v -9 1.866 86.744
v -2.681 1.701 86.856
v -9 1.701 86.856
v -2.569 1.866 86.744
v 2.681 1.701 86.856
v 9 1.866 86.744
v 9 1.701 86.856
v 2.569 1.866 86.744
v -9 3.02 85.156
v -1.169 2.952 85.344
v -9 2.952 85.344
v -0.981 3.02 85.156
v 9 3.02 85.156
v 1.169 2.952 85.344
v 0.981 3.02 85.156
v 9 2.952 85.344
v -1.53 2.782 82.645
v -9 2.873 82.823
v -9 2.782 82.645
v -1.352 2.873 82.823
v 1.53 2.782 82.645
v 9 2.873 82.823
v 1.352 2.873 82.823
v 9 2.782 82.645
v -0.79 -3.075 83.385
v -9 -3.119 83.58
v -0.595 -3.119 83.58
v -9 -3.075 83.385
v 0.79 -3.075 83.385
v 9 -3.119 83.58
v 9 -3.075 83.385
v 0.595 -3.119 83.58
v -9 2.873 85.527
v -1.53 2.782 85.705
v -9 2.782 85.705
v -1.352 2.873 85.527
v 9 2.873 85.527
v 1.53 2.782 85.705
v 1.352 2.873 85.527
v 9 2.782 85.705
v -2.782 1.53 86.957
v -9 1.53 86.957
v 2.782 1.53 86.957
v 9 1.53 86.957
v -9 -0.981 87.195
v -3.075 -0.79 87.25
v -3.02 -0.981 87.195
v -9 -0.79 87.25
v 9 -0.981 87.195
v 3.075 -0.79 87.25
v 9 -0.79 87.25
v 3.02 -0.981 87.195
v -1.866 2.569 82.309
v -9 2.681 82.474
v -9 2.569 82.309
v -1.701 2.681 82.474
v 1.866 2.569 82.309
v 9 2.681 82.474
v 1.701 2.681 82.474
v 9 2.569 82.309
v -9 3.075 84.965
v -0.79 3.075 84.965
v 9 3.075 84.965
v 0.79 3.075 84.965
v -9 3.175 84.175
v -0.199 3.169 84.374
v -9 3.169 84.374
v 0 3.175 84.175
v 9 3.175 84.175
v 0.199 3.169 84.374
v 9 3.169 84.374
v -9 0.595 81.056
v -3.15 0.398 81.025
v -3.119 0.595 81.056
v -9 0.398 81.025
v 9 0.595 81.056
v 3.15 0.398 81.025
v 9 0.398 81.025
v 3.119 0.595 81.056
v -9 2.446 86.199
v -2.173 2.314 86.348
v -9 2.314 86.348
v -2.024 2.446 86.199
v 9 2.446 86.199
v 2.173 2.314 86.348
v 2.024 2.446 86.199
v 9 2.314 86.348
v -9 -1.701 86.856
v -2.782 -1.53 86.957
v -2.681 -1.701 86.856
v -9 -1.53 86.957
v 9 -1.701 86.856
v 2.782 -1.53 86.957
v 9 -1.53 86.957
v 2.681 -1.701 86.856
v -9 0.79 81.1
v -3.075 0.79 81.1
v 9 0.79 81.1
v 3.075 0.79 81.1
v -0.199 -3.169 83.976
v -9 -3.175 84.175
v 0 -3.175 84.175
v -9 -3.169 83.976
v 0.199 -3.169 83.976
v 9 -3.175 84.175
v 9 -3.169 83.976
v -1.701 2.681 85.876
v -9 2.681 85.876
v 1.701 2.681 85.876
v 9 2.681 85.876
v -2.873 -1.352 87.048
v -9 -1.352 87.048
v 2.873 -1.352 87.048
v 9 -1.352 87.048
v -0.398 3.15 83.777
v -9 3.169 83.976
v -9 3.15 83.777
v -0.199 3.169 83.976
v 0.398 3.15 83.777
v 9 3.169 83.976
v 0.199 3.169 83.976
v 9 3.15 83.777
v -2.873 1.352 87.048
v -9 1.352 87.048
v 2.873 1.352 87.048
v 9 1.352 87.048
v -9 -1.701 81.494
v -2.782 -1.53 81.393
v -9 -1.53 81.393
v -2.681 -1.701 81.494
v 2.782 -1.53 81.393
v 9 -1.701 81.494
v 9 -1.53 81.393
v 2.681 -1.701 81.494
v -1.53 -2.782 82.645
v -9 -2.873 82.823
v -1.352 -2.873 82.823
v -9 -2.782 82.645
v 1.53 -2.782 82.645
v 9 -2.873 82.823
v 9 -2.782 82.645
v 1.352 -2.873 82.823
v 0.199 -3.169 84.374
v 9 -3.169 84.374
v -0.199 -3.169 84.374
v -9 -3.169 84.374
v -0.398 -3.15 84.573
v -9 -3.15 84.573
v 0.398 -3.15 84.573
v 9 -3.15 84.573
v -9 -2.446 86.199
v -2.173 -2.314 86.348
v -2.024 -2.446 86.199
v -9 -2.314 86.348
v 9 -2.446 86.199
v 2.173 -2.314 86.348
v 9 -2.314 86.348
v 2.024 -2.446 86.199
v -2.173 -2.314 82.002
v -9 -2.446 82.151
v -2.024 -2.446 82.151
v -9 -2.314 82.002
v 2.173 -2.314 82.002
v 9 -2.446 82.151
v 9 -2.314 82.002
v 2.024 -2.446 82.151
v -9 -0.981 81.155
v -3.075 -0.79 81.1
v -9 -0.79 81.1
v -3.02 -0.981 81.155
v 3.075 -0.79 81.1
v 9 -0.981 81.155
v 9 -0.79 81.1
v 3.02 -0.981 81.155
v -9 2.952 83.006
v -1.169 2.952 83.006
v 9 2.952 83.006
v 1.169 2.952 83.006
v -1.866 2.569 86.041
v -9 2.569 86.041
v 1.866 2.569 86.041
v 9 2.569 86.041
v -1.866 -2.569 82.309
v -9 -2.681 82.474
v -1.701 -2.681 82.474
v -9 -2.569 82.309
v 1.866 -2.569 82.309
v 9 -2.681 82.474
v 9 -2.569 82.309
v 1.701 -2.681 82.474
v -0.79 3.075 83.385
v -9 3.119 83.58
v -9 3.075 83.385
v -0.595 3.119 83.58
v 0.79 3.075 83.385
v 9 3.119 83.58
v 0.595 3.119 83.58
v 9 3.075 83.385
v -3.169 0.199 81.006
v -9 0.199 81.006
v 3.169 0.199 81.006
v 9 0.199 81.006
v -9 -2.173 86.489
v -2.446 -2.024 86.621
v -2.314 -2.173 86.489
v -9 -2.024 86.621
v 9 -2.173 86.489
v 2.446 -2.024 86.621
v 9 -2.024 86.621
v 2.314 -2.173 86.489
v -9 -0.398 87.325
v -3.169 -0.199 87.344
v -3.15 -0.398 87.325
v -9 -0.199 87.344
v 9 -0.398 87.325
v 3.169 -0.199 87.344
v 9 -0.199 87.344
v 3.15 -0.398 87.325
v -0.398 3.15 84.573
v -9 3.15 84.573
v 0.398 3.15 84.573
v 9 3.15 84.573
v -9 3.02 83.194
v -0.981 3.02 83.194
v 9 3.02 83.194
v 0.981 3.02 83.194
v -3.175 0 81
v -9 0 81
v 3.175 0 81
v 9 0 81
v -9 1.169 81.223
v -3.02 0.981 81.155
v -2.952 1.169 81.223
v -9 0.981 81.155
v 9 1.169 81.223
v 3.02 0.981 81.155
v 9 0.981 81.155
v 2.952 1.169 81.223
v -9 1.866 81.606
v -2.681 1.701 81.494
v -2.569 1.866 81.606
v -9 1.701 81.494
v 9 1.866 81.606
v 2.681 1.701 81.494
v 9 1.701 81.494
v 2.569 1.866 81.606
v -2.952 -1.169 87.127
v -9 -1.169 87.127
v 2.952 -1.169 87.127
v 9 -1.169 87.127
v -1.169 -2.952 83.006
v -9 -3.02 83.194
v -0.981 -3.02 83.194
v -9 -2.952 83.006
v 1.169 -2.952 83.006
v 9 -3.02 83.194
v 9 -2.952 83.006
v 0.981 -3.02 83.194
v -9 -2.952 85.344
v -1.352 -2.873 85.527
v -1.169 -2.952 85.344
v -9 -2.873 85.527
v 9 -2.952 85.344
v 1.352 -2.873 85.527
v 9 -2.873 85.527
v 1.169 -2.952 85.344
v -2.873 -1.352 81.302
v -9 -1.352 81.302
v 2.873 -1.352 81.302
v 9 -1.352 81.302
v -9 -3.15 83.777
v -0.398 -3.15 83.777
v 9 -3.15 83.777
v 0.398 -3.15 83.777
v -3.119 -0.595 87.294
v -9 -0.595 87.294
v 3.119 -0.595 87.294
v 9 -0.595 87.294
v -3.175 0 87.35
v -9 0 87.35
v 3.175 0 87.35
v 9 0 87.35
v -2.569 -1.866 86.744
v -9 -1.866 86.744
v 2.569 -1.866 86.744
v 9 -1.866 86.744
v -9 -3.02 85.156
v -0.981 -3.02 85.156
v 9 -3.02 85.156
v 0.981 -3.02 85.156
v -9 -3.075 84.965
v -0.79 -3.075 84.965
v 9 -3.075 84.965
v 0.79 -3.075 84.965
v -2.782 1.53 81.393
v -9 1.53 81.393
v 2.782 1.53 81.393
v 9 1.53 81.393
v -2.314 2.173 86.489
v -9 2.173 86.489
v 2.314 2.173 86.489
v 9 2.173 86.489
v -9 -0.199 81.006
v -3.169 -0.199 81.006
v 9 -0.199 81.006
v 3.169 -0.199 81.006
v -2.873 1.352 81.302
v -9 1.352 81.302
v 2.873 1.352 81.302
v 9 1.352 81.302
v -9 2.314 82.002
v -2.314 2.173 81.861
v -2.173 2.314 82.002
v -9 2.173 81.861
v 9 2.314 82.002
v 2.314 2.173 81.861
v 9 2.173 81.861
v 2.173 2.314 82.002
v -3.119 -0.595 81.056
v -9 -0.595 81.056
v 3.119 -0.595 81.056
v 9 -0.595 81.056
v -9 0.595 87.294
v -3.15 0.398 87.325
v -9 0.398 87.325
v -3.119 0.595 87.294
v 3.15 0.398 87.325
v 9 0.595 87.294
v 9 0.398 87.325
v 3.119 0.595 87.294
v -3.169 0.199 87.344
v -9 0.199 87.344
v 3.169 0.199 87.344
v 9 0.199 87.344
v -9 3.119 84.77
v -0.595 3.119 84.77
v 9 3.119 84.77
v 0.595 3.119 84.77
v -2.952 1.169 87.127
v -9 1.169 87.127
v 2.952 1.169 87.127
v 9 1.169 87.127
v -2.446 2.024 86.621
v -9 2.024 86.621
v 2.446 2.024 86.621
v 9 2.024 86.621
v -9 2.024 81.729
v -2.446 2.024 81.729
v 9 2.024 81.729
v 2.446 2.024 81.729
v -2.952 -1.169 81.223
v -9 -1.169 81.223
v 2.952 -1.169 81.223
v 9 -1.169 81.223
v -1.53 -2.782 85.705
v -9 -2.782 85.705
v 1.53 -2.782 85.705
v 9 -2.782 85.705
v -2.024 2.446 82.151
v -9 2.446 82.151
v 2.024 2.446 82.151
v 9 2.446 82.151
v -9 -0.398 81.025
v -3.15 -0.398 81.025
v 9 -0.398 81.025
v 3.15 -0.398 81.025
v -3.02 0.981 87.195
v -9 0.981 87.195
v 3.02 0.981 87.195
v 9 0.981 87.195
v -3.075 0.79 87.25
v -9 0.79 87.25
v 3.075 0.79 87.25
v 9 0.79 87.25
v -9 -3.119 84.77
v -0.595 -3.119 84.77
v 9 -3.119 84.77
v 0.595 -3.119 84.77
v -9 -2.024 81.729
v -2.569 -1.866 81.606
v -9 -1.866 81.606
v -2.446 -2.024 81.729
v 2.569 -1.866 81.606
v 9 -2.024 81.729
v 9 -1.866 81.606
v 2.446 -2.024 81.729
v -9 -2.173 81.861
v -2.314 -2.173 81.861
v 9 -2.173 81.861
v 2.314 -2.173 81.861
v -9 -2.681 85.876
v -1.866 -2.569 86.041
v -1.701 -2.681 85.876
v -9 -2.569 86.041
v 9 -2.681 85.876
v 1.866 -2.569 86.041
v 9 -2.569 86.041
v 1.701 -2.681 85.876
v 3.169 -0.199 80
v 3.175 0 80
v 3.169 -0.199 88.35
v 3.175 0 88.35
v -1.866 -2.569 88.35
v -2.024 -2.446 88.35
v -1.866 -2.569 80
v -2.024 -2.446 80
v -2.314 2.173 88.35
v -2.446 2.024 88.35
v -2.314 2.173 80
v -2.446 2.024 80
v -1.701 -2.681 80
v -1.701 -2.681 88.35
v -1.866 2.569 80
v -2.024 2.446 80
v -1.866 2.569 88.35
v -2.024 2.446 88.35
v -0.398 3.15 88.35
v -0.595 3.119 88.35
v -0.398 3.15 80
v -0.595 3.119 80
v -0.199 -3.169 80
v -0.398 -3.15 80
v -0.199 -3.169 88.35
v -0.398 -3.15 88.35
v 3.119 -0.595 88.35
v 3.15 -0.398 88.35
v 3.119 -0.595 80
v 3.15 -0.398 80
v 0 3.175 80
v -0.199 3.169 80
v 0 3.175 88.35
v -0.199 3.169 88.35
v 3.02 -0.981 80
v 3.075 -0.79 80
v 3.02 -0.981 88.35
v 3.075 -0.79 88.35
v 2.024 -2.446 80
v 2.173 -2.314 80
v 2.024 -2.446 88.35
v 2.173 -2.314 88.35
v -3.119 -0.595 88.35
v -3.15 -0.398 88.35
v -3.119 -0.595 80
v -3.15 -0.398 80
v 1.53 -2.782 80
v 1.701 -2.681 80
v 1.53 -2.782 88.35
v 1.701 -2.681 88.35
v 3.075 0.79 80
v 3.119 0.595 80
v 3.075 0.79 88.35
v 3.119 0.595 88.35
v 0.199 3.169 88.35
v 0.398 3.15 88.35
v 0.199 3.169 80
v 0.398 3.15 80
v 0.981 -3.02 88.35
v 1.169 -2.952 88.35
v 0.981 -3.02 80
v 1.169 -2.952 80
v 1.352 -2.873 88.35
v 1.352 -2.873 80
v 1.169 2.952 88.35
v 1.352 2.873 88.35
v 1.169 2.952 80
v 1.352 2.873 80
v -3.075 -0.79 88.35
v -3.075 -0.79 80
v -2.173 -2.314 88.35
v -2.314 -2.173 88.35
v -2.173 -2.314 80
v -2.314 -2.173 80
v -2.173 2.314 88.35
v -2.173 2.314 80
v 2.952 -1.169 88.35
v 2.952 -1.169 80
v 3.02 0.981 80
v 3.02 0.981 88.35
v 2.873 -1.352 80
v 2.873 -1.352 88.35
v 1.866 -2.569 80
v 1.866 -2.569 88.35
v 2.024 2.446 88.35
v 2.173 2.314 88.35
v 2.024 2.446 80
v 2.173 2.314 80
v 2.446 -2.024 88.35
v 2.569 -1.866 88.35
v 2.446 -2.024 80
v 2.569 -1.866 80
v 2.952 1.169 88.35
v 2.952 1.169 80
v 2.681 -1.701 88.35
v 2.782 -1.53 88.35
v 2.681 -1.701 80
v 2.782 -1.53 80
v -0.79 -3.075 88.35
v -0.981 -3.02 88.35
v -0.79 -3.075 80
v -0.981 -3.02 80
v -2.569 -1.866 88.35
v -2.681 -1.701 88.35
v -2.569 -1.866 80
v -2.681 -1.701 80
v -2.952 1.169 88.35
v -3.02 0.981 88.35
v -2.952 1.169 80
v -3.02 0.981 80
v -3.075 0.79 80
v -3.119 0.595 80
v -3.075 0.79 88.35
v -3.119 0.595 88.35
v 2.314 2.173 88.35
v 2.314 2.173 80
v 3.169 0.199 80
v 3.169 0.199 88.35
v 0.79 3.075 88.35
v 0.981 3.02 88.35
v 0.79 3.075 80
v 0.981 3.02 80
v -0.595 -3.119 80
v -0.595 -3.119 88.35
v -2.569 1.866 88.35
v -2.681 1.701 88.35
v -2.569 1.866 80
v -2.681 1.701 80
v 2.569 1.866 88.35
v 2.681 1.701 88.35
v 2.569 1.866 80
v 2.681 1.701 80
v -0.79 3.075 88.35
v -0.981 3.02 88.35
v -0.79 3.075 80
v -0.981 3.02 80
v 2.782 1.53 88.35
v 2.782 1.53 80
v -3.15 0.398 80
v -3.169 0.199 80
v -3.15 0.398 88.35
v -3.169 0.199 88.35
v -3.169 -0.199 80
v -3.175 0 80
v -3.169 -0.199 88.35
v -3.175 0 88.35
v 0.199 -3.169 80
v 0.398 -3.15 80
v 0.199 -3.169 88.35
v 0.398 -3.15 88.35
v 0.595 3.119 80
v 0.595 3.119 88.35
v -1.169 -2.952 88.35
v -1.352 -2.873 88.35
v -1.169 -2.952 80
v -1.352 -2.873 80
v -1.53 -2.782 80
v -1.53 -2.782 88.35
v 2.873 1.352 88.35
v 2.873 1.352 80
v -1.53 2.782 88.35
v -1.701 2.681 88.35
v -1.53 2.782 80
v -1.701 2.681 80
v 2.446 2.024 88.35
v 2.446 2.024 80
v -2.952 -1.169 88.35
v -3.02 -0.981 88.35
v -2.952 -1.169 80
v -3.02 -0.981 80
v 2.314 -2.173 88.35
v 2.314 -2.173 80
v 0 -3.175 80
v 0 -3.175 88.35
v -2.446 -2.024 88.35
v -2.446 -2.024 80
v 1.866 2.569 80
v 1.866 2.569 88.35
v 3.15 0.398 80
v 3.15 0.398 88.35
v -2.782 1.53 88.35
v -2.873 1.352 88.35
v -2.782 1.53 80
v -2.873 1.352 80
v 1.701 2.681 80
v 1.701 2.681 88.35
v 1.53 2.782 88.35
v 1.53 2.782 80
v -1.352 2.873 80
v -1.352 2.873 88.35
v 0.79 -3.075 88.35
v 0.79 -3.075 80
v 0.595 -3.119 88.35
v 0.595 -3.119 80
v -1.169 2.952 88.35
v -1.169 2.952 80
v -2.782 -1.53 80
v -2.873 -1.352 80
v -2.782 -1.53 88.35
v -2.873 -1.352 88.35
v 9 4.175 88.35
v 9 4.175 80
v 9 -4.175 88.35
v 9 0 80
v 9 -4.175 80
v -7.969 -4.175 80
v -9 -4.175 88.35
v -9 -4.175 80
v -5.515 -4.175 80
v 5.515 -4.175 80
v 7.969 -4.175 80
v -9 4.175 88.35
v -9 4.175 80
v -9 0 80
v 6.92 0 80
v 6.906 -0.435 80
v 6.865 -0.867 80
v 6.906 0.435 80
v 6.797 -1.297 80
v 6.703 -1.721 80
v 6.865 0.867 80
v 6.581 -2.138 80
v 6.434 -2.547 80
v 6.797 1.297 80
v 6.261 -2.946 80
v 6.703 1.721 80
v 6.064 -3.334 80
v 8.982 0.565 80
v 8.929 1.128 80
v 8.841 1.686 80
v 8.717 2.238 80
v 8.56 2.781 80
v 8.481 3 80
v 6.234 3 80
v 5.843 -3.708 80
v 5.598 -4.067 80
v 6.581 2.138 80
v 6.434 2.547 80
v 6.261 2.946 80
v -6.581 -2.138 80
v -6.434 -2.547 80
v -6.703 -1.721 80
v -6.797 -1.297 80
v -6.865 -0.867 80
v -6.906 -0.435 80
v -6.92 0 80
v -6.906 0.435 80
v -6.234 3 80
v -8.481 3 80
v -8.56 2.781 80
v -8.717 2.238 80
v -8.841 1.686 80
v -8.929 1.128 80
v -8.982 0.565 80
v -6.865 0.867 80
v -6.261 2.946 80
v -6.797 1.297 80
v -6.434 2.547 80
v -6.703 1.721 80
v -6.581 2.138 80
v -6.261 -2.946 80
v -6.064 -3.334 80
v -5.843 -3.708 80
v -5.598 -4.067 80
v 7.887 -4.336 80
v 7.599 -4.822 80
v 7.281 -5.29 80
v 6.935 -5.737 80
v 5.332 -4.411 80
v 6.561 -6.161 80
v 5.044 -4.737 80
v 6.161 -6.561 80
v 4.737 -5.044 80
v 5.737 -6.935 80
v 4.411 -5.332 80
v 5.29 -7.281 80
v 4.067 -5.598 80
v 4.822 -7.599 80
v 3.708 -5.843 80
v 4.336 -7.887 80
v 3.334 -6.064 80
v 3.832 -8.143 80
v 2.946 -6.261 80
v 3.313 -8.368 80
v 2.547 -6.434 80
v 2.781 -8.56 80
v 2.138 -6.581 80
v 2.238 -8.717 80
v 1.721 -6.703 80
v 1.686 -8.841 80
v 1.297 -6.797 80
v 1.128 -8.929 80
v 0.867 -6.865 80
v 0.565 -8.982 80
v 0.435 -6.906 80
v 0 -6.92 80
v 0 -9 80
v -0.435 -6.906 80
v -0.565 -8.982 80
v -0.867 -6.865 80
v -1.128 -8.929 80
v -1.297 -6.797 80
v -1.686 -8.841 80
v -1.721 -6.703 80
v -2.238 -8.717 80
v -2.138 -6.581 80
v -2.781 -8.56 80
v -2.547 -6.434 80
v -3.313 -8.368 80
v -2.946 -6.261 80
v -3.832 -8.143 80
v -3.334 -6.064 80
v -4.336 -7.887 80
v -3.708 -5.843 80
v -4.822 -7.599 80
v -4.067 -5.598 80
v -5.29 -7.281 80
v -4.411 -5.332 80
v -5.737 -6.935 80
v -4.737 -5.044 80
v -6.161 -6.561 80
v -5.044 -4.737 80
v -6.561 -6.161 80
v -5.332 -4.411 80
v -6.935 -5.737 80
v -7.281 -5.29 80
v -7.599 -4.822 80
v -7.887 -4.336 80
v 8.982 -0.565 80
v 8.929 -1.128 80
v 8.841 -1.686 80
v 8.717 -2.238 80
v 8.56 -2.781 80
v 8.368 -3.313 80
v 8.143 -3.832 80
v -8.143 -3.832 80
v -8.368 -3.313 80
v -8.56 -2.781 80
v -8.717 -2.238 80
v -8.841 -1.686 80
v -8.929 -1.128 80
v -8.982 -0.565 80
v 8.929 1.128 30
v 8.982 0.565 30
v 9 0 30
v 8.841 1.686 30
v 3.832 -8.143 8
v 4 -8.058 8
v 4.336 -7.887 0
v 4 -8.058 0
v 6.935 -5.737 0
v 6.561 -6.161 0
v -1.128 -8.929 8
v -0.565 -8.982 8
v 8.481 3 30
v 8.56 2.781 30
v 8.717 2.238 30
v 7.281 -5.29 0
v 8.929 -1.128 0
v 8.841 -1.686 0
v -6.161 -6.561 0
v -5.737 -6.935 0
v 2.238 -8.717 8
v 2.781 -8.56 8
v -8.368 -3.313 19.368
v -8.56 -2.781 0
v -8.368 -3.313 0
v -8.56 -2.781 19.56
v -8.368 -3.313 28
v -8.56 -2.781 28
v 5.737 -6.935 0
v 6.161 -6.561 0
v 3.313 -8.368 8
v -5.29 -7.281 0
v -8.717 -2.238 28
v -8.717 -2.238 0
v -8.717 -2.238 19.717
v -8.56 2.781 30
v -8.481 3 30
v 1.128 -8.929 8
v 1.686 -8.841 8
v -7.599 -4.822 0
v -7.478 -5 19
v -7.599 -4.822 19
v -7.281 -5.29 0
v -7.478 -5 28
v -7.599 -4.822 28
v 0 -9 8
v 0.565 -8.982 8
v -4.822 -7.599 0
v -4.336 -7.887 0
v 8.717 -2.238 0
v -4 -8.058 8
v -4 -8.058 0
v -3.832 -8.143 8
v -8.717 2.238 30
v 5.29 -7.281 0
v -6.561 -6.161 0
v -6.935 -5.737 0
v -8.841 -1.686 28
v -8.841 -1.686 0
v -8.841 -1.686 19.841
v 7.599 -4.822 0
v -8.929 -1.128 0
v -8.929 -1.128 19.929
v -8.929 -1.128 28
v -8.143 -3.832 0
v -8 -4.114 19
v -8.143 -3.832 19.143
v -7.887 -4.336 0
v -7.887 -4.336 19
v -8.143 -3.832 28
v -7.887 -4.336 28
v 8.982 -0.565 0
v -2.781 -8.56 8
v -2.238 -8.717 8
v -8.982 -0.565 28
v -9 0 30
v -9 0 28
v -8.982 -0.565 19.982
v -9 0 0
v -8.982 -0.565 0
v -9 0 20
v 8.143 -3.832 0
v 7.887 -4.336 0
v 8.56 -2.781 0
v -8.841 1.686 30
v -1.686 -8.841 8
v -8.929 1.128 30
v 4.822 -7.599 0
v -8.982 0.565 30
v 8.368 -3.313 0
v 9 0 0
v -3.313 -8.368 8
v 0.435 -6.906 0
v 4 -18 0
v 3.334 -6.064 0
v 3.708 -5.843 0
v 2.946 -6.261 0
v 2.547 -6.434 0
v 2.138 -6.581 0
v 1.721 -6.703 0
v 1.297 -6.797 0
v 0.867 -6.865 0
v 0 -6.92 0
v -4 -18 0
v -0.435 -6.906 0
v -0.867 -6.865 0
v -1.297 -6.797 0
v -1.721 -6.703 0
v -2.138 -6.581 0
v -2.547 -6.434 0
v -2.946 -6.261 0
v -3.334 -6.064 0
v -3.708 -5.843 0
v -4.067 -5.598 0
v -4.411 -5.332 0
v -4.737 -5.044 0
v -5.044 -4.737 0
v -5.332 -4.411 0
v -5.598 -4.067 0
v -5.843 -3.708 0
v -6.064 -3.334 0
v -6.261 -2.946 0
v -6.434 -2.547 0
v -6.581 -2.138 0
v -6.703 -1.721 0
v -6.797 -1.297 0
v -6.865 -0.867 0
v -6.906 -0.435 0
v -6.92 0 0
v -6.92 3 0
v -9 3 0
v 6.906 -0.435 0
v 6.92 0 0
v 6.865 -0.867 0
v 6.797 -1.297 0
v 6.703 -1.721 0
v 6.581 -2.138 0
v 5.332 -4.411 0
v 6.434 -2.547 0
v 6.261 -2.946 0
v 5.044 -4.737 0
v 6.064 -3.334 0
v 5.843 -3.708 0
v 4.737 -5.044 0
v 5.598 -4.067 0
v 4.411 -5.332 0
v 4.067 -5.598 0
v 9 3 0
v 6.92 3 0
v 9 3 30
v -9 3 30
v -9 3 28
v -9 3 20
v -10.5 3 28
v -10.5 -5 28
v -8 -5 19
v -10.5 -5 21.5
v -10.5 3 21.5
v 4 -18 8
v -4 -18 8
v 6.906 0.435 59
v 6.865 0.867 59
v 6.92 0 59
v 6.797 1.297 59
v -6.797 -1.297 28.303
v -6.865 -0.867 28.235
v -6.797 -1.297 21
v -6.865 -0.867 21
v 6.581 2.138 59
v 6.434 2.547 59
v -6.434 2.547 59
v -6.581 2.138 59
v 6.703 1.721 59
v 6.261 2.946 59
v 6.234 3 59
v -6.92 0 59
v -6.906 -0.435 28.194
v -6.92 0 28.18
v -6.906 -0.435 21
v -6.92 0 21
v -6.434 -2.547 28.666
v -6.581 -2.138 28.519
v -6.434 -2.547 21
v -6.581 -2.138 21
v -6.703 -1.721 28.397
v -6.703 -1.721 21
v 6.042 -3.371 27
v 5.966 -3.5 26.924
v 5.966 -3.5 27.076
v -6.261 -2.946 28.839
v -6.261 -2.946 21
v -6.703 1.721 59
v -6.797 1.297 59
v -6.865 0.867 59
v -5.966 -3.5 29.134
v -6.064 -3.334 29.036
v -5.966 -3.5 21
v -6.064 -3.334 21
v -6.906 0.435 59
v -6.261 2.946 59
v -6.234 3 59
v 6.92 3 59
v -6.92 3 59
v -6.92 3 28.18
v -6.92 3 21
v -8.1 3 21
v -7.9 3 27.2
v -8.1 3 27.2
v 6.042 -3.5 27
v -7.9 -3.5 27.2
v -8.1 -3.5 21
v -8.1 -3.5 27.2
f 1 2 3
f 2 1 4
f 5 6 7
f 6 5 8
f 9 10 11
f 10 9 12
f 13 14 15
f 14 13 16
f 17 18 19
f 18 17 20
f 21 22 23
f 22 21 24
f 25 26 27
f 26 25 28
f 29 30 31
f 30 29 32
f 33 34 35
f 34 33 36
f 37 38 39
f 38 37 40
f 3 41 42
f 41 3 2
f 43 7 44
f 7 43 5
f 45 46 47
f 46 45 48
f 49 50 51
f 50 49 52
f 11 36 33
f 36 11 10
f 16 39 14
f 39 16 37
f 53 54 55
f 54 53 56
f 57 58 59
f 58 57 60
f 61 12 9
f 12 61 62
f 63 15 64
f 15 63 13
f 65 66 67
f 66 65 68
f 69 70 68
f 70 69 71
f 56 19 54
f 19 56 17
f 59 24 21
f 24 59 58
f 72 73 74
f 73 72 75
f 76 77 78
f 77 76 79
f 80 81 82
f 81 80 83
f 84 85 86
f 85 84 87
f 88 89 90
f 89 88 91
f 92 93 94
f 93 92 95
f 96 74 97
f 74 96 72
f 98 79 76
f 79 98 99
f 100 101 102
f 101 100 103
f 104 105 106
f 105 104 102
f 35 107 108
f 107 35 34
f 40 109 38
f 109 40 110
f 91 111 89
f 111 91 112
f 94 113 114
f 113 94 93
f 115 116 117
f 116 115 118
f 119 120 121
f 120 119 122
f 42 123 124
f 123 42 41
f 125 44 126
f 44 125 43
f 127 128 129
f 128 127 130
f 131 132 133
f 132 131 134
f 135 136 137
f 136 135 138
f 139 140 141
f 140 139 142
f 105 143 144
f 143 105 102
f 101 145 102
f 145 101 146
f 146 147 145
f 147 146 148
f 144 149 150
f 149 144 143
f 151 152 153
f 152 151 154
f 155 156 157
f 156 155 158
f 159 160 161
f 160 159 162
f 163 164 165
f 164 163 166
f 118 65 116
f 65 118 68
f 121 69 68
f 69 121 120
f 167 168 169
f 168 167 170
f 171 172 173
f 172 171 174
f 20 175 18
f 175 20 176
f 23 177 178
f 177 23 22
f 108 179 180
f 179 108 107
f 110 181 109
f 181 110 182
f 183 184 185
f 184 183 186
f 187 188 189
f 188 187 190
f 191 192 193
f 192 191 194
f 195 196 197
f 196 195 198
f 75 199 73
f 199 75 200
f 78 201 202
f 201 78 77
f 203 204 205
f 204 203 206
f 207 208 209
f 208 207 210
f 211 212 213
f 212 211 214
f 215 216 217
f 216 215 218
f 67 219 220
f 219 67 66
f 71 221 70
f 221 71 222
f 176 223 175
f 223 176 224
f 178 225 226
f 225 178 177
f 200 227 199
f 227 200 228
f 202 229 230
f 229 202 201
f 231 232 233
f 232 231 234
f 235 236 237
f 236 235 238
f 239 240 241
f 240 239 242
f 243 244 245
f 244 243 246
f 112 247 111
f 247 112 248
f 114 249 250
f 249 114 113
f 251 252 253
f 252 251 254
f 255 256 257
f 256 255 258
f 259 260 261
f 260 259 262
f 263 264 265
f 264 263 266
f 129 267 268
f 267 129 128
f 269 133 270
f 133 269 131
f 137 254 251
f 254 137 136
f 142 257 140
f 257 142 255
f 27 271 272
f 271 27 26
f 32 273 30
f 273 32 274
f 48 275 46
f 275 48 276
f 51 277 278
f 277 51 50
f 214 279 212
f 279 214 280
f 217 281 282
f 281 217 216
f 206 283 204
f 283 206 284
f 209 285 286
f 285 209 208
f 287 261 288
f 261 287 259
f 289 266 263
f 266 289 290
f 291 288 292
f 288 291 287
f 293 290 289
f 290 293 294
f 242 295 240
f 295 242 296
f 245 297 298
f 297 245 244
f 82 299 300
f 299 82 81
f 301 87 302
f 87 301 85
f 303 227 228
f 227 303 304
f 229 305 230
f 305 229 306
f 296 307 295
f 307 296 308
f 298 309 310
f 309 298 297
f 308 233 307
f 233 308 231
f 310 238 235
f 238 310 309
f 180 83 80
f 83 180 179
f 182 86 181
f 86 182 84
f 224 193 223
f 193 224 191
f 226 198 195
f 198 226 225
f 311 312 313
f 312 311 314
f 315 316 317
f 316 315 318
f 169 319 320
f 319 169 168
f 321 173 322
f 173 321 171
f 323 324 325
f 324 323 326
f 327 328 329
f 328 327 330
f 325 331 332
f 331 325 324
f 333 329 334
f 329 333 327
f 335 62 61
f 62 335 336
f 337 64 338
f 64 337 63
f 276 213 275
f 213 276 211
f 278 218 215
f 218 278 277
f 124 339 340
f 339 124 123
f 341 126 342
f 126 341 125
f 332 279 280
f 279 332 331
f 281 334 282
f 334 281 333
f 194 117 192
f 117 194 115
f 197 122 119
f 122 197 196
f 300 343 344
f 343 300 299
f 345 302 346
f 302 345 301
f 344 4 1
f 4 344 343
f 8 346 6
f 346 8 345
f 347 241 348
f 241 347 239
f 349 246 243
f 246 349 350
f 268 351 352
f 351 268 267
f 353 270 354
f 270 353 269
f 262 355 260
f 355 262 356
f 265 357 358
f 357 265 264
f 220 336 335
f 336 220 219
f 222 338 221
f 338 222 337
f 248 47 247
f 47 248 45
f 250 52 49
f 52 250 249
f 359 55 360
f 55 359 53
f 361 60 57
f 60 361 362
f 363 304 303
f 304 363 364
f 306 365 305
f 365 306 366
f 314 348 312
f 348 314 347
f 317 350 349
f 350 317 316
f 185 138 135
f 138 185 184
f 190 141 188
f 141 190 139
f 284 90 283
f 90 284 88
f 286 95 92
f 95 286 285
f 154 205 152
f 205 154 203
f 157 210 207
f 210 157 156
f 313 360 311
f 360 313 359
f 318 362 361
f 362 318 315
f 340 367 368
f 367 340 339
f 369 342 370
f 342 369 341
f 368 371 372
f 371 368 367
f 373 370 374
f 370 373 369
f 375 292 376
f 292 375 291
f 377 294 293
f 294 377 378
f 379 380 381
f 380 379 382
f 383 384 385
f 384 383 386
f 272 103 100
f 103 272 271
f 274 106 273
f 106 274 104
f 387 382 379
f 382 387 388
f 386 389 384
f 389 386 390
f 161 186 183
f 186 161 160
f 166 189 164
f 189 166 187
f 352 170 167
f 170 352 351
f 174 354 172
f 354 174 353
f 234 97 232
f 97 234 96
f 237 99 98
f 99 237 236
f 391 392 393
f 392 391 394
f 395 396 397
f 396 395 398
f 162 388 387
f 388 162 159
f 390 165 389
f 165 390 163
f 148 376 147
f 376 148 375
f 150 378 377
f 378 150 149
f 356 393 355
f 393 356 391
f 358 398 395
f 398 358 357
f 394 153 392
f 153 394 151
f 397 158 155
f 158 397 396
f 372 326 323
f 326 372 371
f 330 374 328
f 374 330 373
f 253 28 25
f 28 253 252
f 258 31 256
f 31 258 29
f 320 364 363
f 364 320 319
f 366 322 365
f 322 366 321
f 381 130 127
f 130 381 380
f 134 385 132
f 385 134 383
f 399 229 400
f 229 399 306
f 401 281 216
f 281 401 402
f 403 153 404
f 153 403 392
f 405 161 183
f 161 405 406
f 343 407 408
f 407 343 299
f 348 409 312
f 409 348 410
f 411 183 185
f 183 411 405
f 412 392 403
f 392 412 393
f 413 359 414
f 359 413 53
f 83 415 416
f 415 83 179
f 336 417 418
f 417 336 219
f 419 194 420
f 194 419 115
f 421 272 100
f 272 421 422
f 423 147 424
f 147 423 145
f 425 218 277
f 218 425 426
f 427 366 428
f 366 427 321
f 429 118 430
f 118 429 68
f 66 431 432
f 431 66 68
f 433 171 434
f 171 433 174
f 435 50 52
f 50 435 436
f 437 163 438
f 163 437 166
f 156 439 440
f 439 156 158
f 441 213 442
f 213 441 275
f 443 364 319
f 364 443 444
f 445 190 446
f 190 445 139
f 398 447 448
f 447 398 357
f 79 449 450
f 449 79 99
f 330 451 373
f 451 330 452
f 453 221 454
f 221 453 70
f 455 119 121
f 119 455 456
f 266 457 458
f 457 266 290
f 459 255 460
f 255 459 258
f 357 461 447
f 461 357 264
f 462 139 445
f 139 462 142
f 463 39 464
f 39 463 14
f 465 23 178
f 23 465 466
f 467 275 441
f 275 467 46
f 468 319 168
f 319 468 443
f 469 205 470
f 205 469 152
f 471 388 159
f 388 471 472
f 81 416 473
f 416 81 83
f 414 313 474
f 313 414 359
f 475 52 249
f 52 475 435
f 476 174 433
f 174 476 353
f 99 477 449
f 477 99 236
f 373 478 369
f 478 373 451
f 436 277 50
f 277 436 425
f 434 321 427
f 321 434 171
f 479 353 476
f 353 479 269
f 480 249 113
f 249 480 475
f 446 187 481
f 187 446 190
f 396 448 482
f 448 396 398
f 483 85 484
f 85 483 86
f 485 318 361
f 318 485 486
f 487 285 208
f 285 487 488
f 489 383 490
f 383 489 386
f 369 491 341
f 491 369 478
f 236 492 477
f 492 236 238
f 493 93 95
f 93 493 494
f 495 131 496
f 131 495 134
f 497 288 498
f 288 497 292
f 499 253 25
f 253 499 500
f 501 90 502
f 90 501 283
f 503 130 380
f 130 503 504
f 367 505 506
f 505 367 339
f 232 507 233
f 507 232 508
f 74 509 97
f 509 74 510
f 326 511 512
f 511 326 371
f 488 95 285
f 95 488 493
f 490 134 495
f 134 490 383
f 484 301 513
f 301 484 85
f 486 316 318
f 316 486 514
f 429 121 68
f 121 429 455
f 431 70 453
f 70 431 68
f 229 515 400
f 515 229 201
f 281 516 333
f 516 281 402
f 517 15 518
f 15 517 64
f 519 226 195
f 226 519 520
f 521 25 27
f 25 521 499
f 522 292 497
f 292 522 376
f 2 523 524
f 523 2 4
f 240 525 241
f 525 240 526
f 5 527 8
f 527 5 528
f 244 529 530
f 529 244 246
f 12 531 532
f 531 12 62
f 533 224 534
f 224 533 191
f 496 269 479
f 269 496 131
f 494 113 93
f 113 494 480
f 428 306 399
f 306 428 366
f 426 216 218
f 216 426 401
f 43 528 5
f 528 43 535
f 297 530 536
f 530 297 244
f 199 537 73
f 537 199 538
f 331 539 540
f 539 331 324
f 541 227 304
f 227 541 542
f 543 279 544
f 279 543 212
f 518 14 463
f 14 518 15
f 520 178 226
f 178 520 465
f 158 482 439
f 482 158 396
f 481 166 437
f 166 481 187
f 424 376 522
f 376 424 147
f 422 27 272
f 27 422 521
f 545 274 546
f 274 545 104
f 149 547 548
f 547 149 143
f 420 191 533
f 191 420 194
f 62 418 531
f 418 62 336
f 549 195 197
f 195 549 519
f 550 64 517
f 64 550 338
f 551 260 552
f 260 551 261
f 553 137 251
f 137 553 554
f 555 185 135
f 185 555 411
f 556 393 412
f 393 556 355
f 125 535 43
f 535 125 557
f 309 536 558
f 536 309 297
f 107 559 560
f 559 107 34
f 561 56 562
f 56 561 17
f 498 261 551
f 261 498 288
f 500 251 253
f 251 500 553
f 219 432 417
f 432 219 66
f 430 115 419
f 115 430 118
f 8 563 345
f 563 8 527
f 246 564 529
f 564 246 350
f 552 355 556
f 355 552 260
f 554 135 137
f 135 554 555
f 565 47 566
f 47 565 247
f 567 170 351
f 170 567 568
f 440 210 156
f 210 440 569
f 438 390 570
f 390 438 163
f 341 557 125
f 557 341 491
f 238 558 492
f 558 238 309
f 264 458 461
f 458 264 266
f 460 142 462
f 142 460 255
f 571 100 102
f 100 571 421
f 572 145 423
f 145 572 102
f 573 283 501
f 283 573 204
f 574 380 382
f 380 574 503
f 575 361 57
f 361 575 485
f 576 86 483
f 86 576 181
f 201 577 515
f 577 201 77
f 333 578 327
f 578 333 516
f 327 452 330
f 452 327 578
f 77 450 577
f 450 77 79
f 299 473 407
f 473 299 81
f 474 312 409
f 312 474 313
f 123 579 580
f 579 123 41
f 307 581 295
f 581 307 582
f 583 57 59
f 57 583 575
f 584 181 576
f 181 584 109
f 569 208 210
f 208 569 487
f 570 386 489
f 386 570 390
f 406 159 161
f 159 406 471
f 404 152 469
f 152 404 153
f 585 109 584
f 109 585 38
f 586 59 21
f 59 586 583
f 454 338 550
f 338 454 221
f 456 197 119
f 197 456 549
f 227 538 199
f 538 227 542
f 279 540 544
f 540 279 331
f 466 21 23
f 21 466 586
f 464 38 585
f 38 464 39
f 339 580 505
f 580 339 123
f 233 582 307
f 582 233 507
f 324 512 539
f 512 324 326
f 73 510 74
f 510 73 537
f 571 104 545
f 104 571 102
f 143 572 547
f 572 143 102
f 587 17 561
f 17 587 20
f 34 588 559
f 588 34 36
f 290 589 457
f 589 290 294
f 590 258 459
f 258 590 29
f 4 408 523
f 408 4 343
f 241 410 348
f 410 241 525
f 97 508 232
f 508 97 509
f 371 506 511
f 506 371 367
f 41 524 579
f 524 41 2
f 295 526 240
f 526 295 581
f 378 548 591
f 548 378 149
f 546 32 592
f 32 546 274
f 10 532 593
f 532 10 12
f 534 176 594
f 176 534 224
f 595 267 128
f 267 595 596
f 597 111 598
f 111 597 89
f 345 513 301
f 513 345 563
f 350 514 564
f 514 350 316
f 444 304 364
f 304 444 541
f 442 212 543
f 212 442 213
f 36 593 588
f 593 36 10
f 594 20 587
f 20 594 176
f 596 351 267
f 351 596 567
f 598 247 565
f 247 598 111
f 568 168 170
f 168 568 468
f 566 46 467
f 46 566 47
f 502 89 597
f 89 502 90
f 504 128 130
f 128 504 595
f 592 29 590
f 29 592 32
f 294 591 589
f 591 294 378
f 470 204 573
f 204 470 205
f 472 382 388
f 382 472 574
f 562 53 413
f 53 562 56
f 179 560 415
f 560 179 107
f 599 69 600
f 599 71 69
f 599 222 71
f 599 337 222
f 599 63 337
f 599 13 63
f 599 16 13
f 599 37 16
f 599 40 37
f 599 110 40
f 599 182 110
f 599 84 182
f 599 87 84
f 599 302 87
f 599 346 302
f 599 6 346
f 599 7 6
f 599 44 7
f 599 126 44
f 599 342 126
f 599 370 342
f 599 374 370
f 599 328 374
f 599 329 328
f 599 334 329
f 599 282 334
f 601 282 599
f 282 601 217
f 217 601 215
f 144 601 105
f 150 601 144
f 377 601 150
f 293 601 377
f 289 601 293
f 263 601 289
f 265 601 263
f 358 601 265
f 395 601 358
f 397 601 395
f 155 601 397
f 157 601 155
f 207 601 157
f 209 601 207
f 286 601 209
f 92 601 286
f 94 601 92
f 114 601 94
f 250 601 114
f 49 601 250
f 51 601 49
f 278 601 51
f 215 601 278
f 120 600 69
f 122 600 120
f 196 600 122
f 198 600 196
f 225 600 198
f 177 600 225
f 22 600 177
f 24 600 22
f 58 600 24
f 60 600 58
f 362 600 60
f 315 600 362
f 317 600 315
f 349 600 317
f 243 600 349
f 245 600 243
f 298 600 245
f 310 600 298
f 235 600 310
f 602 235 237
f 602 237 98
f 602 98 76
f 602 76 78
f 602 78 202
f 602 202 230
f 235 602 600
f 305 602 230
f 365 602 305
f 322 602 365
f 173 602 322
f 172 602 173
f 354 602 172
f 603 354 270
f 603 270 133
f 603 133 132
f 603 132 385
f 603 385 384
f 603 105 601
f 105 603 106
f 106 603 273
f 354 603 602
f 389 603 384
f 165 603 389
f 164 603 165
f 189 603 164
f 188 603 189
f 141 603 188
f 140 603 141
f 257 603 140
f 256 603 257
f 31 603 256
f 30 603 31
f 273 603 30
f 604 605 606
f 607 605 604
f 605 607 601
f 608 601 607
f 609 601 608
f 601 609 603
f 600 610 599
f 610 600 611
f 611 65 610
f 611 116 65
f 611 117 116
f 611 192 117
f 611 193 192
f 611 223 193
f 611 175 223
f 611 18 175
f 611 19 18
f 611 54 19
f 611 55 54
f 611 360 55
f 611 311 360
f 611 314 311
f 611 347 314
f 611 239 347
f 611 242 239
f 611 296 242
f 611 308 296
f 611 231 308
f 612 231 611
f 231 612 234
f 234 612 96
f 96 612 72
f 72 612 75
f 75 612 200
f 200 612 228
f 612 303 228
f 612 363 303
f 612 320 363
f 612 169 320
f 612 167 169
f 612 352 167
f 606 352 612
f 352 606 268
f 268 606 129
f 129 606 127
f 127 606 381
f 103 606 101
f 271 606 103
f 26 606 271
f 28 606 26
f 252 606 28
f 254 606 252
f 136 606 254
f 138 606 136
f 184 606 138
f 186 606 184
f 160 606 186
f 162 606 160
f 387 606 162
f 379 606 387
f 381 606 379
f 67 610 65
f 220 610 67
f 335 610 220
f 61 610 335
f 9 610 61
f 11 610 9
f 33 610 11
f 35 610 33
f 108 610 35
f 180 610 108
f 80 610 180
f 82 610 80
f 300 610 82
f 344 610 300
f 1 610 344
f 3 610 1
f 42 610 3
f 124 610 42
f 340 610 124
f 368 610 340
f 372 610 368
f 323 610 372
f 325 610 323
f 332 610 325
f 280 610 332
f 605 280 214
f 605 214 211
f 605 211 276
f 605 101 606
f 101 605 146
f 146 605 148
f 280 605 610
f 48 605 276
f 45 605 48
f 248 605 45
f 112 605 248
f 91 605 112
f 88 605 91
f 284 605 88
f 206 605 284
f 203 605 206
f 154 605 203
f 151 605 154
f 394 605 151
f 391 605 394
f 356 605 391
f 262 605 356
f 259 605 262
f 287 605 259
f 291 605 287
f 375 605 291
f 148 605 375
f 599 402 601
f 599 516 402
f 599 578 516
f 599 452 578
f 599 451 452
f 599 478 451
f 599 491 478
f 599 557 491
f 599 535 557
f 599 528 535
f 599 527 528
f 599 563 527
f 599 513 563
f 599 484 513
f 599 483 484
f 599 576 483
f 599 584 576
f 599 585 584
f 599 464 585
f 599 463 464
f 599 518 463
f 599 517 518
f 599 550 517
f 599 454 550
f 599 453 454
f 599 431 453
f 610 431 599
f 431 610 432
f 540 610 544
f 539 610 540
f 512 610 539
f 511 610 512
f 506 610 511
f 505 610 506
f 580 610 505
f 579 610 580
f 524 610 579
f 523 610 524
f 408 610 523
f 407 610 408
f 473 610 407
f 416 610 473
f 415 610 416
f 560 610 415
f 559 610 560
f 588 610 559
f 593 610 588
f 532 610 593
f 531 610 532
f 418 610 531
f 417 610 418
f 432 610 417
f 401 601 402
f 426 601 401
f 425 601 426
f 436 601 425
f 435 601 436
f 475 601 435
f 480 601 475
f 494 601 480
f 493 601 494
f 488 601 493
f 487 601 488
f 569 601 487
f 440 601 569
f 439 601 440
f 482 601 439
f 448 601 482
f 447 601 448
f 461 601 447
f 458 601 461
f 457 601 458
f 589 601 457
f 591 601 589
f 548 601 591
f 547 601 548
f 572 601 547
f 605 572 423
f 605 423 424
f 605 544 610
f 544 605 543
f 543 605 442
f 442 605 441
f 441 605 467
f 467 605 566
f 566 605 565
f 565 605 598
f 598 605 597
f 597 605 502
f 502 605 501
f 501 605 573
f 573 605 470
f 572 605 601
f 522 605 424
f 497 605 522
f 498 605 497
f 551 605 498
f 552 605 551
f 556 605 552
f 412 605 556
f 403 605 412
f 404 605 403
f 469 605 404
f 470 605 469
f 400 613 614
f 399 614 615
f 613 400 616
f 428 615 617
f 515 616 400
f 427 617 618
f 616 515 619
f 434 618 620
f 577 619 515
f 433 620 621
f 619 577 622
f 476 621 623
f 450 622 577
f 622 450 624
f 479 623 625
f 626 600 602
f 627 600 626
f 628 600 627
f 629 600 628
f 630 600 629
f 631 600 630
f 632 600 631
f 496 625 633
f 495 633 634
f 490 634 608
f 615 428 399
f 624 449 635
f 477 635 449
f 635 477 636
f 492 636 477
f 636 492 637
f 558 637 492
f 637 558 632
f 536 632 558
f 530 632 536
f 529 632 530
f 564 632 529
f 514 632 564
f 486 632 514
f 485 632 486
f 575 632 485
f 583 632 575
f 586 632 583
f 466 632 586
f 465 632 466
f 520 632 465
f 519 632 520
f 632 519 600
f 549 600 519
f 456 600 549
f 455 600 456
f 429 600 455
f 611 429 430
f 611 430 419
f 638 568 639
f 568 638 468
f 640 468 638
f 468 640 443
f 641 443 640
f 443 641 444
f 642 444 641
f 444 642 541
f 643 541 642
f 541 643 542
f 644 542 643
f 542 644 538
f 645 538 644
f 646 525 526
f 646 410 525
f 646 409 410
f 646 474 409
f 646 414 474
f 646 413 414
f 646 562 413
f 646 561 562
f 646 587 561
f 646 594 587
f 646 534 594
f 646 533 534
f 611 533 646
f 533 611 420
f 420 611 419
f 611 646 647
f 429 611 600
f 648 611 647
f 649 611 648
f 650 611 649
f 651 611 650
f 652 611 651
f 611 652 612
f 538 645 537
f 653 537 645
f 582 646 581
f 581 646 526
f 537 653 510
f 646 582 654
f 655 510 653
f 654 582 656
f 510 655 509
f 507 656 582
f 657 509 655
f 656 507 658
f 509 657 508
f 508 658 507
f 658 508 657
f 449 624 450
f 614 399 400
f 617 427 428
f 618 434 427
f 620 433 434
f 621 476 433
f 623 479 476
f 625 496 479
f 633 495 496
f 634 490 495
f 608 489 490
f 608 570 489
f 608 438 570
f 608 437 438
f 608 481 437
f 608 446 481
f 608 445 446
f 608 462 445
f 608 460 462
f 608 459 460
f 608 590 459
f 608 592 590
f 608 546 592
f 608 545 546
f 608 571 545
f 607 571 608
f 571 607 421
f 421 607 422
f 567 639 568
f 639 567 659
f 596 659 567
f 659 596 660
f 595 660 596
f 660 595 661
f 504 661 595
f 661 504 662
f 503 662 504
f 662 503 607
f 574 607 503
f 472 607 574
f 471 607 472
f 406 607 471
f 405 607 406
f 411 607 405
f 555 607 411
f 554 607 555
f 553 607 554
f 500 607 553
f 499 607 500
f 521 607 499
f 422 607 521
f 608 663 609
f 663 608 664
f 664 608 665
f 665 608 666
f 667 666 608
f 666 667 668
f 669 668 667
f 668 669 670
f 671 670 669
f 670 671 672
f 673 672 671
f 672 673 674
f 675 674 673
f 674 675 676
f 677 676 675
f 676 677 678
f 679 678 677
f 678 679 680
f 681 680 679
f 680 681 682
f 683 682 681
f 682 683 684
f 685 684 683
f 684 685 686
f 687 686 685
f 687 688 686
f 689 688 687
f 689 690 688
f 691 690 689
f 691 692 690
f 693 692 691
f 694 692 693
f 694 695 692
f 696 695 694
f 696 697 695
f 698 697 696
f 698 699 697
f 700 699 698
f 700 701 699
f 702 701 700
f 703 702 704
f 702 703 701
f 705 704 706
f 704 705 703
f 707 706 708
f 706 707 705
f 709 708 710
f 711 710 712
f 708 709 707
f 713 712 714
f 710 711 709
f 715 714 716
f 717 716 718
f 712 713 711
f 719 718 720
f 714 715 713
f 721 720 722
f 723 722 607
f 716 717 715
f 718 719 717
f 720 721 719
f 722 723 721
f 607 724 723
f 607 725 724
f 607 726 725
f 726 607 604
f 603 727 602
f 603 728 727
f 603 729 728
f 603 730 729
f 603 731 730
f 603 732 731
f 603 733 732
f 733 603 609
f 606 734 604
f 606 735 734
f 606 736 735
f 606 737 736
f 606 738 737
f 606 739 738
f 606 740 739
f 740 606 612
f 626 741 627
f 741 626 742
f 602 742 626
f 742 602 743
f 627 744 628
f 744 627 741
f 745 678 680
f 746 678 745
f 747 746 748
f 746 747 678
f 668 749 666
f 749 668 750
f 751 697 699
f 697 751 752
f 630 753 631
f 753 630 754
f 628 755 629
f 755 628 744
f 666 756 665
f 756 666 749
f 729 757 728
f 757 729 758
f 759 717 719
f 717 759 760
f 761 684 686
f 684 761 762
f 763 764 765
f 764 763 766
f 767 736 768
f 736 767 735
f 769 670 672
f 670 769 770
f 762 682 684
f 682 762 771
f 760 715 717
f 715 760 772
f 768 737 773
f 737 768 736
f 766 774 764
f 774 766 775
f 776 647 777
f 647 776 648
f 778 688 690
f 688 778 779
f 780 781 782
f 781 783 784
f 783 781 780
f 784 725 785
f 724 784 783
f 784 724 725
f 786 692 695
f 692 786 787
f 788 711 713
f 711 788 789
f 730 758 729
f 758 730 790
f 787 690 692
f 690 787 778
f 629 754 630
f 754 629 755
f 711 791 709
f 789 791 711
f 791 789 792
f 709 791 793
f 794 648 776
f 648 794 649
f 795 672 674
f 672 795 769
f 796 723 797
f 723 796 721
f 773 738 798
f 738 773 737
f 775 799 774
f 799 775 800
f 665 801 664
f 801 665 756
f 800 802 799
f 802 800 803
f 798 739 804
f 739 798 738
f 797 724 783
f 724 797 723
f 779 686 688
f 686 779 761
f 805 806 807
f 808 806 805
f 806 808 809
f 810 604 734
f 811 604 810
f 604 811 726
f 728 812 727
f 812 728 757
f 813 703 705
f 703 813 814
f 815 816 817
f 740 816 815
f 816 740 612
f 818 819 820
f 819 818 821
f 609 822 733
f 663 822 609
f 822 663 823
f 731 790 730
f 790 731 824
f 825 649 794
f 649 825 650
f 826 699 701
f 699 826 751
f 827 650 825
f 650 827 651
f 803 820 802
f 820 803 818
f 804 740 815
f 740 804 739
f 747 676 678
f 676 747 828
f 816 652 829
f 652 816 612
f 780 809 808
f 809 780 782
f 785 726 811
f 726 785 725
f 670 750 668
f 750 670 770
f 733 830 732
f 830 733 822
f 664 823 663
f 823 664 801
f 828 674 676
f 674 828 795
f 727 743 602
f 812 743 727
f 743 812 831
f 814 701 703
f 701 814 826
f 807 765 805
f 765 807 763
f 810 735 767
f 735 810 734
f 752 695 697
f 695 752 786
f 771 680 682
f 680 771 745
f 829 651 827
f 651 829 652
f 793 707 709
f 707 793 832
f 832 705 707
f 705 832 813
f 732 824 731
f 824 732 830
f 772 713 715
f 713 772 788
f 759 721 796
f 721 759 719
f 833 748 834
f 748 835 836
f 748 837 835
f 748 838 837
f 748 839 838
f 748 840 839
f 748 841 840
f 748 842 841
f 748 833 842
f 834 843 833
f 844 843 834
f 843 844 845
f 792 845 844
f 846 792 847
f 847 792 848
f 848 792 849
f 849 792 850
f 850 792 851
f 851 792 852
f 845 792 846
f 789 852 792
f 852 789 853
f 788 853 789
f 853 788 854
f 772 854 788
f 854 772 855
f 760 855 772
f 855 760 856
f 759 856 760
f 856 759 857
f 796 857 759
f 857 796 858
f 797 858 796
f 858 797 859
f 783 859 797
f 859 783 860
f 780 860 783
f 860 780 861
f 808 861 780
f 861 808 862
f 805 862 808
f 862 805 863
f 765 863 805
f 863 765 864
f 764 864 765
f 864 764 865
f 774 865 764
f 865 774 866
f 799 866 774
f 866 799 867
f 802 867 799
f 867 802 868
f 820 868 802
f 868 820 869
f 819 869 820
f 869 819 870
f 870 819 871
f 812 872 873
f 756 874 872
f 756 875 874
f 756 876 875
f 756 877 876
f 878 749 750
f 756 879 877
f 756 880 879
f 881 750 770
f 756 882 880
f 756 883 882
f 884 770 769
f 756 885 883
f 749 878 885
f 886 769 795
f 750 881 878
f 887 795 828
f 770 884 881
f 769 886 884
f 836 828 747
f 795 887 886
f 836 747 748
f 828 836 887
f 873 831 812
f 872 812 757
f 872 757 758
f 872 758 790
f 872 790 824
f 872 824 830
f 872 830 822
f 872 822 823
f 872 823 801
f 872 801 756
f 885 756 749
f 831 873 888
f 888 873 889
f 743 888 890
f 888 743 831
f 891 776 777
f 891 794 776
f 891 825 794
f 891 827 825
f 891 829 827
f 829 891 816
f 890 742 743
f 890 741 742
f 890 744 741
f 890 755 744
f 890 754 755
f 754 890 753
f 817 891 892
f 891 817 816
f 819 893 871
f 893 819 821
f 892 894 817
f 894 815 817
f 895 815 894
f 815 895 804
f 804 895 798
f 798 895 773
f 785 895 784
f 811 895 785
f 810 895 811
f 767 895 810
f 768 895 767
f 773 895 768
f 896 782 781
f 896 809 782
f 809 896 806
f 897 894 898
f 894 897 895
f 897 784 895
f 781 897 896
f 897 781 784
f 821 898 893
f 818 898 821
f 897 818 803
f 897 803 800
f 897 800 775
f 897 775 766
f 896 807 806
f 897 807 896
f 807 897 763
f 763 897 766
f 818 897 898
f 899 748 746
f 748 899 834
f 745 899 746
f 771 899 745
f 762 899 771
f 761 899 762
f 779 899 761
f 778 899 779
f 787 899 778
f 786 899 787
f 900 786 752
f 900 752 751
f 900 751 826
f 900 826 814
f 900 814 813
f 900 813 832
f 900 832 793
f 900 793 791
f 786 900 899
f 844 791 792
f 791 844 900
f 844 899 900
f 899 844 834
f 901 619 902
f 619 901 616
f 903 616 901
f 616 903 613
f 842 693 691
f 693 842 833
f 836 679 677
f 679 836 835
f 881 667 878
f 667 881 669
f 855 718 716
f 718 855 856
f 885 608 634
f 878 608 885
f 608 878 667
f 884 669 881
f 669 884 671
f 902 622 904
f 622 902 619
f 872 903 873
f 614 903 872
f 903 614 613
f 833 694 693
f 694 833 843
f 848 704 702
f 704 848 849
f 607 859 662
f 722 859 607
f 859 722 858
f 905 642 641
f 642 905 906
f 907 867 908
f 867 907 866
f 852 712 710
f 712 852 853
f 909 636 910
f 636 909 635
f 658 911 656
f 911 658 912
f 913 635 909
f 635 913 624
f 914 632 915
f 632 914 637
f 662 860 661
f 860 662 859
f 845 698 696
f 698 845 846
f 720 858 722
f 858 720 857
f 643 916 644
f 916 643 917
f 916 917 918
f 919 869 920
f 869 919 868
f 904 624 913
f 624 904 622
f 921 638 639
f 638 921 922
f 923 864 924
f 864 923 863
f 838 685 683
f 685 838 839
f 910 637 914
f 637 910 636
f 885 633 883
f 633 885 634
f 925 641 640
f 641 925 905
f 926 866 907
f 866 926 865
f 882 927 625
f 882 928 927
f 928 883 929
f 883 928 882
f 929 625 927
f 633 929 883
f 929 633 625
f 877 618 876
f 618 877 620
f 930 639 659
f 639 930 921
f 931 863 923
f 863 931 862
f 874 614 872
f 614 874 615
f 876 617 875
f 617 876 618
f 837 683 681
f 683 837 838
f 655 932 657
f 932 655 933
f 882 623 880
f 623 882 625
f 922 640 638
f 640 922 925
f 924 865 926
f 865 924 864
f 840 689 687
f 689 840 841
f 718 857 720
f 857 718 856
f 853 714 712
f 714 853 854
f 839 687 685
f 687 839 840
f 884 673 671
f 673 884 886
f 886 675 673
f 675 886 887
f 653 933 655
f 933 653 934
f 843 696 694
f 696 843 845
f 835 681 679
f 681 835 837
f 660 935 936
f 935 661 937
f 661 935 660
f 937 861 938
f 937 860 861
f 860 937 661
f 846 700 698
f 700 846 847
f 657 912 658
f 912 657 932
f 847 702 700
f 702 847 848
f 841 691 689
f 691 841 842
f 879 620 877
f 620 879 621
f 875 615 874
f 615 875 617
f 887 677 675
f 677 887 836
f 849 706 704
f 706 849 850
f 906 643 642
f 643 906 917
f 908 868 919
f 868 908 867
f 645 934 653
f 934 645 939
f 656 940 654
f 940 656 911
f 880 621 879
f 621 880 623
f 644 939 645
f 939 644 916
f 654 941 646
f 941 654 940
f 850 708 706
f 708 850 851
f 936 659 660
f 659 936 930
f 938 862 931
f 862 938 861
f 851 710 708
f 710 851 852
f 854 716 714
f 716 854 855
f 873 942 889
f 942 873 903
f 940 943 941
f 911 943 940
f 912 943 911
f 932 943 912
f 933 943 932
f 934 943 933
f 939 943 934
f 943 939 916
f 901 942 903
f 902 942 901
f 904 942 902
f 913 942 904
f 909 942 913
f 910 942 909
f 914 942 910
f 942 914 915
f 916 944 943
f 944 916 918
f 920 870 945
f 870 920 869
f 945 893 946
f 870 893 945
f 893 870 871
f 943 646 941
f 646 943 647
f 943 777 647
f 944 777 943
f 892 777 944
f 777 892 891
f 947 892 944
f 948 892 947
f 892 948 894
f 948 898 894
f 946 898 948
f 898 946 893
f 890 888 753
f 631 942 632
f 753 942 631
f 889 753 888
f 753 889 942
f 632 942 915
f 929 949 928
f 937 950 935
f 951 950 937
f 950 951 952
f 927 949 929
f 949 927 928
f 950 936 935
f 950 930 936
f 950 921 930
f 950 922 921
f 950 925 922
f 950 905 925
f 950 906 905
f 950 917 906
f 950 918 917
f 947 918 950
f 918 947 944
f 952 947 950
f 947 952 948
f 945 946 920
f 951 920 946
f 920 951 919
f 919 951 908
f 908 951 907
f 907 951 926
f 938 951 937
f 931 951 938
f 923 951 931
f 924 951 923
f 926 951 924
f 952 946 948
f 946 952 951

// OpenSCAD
$fn=100;

barrelLength = 80;

module shell(rad=8) { 
    cylinder(barrelLength,r=rad);
    translate([-rad,0,0]) cube([2*rad,2*rad,30]);
}

module outer_shell(){ 
    difference(){ 
        union(){
            shell(9);
            translate([-4,-18,0])holder();
            translate([-10.5,-5,19]) extrapowersupport();
        }
        union(){
            translate([0,0,-1])scale([1,1,2])shell(6.92);
            translate([-50,3,-1])cube([100,100,100]);
            translate([-8.1,-3.5,27])rotate(45,[0,1,0])cube([10,10,10]);
        }
    }
}

module powerdivot(){ 
   translate([-(8.1),-3.5,0])cube([6.2, 20,6.2]); 
}
module holder(){ 
    cube([8,12,8]);
}
module extrapowersupport(){ 
    difference(){
        cube([9,20,9]);
        translate([4,-1,-1.5])rotate(-45,[0,1,0])translate([-20,0,0])cube([20,20,20]);
    }
}

module diffractorMount(rodThickness = 6.35) {
	beamHole = 6;
	translate([0,rodThickness/2+1,0]) rotate(90, [1,0,0]) difference() {
		translate([-9,0,0]) cube([2*9,rodThickness+2,rodThickness+2]);
		union() {
			translate([-10,rodThickness/2+1,rodThickness/2+1]) rotate(90, [0,1,0]) cylinder(20,r=rodThickness/2);
			translate([0,10,rodThickness/2+1]) rotate(90, [1,0,0]) cylinder(20,r=rodThickness/2);
		}
	}
}

translate([0,0,barrelLength]) diffractorMount();
difference(){ 
    outer_shell();
    translate([0,0,21])powerdivot();
}
